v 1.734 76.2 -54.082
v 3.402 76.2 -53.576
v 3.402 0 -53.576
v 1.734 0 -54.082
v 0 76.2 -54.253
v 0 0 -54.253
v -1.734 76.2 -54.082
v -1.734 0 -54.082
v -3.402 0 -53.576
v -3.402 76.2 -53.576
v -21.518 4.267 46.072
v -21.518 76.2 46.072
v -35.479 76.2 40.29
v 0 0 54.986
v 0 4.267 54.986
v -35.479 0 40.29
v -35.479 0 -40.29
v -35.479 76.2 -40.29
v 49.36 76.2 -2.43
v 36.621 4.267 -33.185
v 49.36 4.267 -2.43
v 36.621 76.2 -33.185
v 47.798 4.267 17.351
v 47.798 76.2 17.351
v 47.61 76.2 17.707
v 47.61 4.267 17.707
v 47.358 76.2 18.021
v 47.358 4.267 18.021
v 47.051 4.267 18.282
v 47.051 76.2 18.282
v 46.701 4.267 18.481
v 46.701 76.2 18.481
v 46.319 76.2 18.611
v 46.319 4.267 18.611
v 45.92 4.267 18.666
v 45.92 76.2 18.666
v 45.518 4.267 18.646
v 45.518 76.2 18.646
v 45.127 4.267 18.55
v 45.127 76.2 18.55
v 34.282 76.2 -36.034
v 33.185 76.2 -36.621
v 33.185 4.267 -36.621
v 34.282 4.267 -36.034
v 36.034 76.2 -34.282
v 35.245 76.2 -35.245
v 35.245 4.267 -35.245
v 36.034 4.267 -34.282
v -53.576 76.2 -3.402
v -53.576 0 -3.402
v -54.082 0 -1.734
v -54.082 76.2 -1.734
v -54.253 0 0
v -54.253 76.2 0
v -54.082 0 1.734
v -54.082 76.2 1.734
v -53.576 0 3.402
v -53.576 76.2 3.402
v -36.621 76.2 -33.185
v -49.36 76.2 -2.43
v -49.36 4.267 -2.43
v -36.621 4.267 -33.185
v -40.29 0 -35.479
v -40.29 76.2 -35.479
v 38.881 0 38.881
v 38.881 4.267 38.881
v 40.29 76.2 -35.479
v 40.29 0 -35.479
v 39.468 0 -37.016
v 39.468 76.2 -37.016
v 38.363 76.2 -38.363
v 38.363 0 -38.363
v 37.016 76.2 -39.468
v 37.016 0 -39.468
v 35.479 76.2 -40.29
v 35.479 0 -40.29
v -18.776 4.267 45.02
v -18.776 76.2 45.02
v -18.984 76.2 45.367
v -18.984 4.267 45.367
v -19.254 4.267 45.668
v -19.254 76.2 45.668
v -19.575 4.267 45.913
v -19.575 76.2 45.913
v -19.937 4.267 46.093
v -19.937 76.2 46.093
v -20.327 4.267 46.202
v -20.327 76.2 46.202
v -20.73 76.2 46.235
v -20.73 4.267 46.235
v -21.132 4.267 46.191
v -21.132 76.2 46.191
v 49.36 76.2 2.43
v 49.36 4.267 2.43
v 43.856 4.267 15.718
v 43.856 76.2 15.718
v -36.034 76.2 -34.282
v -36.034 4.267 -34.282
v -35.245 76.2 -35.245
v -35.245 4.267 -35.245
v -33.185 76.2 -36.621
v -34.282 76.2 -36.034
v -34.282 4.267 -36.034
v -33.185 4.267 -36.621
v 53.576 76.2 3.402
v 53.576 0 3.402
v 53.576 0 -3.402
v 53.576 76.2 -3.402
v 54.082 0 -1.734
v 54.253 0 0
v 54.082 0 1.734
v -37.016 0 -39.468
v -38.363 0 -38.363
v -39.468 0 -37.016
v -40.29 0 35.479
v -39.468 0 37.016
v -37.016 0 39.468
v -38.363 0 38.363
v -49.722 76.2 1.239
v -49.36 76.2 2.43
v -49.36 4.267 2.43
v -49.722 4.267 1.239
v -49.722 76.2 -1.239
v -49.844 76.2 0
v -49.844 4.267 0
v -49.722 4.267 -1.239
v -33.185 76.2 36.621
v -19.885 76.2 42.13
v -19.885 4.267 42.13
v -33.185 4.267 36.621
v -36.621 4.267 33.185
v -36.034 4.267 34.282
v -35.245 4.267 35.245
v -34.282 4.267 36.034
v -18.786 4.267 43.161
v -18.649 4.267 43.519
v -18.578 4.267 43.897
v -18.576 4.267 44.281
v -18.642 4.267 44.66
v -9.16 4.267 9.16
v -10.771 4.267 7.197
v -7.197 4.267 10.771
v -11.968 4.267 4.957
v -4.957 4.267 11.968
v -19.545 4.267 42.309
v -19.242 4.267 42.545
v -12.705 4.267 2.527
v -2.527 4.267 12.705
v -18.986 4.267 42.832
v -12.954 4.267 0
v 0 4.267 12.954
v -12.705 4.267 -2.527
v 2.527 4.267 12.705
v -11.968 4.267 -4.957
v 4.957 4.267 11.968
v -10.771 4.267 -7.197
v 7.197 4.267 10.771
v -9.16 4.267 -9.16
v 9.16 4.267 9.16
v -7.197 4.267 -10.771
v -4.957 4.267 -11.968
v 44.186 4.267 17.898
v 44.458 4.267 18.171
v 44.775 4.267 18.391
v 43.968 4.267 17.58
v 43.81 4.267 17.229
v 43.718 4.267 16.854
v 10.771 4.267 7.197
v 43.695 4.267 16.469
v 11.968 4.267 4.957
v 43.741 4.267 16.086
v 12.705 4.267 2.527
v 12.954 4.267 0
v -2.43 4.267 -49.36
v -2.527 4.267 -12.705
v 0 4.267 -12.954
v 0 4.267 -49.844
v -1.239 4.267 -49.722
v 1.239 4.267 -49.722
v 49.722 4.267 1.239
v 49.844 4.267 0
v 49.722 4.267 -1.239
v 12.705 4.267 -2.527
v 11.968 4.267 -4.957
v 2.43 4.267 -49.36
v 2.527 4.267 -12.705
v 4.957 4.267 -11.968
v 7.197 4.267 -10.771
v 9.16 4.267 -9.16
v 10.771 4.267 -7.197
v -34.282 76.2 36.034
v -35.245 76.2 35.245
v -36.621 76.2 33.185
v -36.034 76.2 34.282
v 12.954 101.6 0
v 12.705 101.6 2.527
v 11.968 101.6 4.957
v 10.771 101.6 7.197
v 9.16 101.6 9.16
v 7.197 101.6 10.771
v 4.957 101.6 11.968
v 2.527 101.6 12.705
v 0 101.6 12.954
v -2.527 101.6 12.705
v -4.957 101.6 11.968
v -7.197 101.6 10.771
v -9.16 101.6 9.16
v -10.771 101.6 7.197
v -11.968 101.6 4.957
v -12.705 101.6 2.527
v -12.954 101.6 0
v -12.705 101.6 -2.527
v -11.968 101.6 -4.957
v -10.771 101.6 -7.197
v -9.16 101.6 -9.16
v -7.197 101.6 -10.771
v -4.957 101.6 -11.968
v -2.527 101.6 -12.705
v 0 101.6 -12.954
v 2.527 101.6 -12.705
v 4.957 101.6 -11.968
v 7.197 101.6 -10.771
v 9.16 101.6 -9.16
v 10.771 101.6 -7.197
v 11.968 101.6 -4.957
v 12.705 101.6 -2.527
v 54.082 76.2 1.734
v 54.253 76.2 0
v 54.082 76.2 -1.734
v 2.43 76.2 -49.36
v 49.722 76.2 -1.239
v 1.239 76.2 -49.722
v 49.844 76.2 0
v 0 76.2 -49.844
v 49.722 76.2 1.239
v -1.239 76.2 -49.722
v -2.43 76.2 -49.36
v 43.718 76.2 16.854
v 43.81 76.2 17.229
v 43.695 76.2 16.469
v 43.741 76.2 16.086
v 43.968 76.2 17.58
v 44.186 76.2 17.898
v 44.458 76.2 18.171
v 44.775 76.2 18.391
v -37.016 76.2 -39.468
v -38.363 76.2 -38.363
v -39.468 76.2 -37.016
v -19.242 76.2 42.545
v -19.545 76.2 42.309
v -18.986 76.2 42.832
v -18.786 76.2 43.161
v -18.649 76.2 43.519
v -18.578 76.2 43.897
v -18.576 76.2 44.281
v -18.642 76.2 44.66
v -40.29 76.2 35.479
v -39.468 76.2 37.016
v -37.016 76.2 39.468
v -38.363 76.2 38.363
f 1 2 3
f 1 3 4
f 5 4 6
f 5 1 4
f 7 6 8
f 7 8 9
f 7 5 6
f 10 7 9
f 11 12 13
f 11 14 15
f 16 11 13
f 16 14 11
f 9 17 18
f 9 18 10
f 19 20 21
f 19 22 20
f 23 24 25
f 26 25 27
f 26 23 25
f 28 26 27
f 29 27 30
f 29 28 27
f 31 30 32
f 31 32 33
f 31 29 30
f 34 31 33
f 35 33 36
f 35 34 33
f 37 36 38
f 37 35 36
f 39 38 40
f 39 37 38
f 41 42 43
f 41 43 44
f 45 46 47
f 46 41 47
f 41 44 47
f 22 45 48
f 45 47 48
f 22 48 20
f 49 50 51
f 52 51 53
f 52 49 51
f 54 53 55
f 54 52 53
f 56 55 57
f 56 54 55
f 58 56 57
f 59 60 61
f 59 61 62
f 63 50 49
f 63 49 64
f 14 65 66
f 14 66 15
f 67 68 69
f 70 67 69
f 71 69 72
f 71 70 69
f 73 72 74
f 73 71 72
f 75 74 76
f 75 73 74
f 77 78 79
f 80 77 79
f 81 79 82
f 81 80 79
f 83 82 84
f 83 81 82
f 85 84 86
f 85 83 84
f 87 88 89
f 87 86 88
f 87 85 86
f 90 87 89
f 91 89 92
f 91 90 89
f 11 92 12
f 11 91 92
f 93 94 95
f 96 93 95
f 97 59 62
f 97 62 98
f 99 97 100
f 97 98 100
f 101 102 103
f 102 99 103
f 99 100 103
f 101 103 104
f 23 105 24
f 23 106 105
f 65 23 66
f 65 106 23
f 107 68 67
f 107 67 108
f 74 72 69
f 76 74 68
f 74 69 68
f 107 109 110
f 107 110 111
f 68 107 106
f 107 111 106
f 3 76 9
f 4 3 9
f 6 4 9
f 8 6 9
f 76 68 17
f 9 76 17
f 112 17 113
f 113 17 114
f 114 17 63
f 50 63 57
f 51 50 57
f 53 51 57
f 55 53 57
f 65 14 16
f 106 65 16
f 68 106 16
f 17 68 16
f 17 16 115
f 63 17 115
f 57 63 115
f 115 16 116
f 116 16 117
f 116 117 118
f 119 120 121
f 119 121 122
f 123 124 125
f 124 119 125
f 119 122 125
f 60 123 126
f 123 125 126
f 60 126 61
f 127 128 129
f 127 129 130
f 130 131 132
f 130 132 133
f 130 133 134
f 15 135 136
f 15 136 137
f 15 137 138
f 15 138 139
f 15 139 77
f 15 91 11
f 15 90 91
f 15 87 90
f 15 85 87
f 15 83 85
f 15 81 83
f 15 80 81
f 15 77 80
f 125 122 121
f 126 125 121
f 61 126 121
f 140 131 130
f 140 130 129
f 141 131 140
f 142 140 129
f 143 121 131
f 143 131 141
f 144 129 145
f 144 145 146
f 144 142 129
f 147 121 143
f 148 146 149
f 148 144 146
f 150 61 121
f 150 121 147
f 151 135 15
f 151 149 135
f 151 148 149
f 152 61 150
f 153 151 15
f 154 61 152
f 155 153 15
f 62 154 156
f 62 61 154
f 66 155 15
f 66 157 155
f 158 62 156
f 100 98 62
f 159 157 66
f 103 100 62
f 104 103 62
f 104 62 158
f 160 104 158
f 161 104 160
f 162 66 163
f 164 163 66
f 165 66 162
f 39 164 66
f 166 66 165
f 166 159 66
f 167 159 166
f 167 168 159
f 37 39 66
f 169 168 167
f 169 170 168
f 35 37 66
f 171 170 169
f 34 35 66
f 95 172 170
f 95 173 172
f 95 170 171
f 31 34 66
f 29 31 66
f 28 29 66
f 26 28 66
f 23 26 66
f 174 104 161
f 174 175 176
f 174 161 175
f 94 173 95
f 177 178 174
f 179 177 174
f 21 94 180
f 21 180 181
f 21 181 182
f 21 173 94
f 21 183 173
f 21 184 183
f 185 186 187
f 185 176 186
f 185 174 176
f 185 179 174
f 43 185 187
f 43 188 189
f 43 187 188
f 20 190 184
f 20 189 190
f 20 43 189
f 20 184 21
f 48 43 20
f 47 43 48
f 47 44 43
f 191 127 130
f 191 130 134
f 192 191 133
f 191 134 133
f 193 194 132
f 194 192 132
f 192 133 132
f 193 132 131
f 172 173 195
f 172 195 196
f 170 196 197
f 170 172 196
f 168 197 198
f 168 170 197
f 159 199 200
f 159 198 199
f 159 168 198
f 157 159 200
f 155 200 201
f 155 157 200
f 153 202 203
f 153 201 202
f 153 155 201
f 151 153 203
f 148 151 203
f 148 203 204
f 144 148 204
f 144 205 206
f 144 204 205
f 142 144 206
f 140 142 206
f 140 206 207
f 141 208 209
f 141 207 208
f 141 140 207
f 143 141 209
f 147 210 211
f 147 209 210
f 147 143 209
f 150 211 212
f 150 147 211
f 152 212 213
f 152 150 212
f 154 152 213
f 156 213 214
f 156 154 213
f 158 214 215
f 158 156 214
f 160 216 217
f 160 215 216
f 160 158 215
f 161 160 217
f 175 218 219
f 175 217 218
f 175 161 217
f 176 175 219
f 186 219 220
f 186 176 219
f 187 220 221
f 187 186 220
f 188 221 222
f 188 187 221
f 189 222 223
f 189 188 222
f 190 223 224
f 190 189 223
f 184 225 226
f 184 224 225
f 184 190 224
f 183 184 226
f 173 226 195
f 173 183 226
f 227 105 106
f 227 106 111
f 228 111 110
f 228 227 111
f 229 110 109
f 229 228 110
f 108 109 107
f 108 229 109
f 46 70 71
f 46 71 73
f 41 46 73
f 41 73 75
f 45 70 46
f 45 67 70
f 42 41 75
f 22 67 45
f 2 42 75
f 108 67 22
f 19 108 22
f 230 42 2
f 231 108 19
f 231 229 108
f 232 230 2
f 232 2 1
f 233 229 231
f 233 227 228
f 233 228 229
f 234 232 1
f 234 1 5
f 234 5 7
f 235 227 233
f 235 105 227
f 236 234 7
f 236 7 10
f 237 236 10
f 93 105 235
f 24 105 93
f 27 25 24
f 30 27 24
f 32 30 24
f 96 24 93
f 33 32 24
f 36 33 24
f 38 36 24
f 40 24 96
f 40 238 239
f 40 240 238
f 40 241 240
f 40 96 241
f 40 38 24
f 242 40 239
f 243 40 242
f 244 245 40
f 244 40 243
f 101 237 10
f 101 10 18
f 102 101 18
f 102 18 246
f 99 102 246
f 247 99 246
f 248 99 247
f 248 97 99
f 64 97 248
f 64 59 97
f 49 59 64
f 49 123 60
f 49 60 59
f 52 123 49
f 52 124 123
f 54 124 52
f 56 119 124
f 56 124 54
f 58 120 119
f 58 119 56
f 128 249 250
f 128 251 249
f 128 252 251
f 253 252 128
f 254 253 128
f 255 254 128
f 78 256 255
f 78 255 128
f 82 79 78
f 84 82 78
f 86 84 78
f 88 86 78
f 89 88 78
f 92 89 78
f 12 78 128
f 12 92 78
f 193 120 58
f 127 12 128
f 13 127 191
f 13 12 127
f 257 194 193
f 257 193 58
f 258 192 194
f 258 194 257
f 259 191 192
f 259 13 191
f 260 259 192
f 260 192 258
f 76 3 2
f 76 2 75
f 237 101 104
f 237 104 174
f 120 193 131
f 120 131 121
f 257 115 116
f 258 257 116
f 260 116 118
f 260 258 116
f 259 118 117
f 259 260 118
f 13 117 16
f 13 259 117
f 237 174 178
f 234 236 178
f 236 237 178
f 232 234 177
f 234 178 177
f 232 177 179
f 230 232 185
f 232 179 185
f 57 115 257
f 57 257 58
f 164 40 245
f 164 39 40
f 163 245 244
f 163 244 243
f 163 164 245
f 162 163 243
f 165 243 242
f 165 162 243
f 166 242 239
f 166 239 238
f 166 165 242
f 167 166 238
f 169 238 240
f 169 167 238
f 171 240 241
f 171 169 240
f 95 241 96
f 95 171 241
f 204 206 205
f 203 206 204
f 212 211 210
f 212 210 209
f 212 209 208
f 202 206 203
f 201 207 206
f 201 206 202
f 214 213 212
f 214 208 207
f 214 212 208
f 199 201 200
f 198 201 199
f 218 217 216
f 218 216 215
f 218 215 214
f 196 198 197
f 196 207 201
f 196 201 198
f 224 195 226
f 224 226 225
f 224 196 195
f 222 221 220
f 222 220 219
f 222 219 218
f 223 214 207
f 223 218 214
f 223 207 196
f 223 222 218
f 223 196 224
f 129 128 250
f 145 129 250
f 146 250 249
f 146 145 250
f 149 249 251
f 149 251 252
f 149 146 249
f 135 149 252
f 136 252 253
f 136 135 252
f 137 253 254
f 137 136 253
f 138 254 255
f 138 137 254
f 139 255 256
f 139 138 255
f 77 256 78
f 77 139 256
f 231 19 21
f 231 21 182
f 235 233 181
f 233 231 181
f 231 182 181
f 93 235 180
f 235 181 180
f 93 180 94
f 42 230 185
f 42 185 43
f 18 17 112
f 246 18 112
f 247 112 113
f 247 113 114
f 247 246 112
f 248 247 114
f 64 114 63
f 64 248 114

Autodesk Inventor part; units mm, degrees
ref_plane "YZ Plane" through (0, 0, 0) normal (1, 0, 0) x (0, 1, 0)
ref_plane "XZ Plane" through (0, 0, 0) normal (0, 1, 0) x (-1, 0, 0)
ref_plane "XY Plane" through (0, 0, 0) normal (0, 0, 1) x (1, 0, 0)
sketch "Sketch1" plane through (0, 0, 0) normal (0, 1, 0) x (-1, 0, 0)
  line L0 (54.9855, 0) -> (38.8806, -38.8806)
  line L1 (38.8806, -38.8806) -> (0, -54.9855)
  line L2 (0, -54.9855) -> (-38.8806, -38.8806)
  line L3 (-38.8806, -38.8806) -> (-54.9855, 0)
  line L4 (-54.9855, 0) -> (-38.8806, 38.8806)
  line L5 (-38.8806, 38.8806) -> (0, 54.9855)
  line L6 (0, 54.9855) -> (38.8806, 38.8806)
  line L7 (38.8806, 38.8806) -> (54.9855, 0)
  point P0 (0, 0)
  dimension "d0" = 50.8
extrude "Extrusion1" add sketch "Sketch1" along normal blind 76.2
sketch "Sketch2" plane through (0, 76.2, 0) normal (0, 1, 0) x (1, 0, 0)
  line L0 (-50.3667, 0) -> (-35.6147, 35.6147)
  line L1 (-35.6147, 35.6147) -> (0, 50.3667)
  line L2 (0, 50.3667) -> (35.6147, 35.6147)
  line L3 (35.6147, 35.6147) -> (50.3667, 0)
  line L4 (50.3667, 0) -> (35.6147, -35.6147)
  line L5 (35.6147, -35.6147) -> (0, -50.3667)
  line L6 (0, -50.3667) -> (-35.6147, -35.6147)
  line L7 (-35.6147, -35.6147) -> (-50.3667, 0)
  line L8 (38.8806, -38.8806) -> (54.9855, 0) projected
  point P0 (0, 0)
  point P1 (0, 0)
  dimension "d4" = 4.2672
extrude "Extrusion2" cut sketch "Sketch2" against normal blind 71.9328
sketch "Sketch3" plane through (0, 76.2, 0) normal (0, 1, 0) x (1, 0, 0)
  line L0 (-35.6147, -35.6147) -> (-50.3667, 0) projected
  line L1 (-38.8806, -38.8806) -> (0, -54.9855) projected
  line L2 (-32.6208, -74.0252) -> (-0.337, -89.435)
  line L3 (50.3667, 0) -> (35.6147, -35.6147) projected
  line L4 (0, -54.9855) -> (38.8806, -38.8806) projected
  line L5 (63.1414, -63.1414) -> (-0.337, -89.435)
  line L6 (0, -50.3667) -> (-35.6147, -35.6147) projected
  line L7 (-17.8073, -42.9907) -> (-32.6208, -74.0252)
  line L8 (35.6147, 35.6147) -> (50.3667, 0) projected
  line L9 (54.9855, 0) -> (38.8806, 38.8806) projected
  line L10 (82.5817, -31.5707) -> (63.1414, -63.1414)
  line L11 (42.9907, -17.8073) -> (82.5817, -31.5707)
  line L12 (-17.8073, -42.9907) -> (42.9907, -17.8073)
  point P0 (0, 0)
extrude "Extrusion3" cut sketch "Sketch3" against normal blind 71.9328
fillet "Fillet1" radius 2.1336 4 edges at (-17.8073, 40.2336, 42.9907) (-19.648, 40.2336, 46.847) (42.9907, 40.2336, 17.8073) (47.0281, 40.2336, 19.2109)
sketch "Sketch4" plane through (0, 4.2672, 0) normal (0, 1, 0) x (1, 0, 0)
  circle A0 centre (0, 0) radius 12.954
  dimension "d10" = 25.908
extrude "Extrusion4" add sketch "Sketch4" along normal blind 97.3328
fillet "Fillet2" radius 6.35 6 edges at (-50.3667, 40.2336, 0) (-35.6147, 40.2336, -35.6147) (0, 40.2336, -50.3667) (35.6147, 40.2336, -35.6147) (50.3667, 40.2336, 0) (-35.6147, 40.2336, 35.6147)
fillet "Fillet3" radius 8.89 6 edges at (54.9855, 38.1, 0) (38.8806, 38.1, -38.8806) (-38.8806, 38.1, 38.8806) (-54.9855, 38.1, 0) (-38.8806, 38.1, -38.8806) (0, 38.1, -54.9855)
properties part number "holder-8"
